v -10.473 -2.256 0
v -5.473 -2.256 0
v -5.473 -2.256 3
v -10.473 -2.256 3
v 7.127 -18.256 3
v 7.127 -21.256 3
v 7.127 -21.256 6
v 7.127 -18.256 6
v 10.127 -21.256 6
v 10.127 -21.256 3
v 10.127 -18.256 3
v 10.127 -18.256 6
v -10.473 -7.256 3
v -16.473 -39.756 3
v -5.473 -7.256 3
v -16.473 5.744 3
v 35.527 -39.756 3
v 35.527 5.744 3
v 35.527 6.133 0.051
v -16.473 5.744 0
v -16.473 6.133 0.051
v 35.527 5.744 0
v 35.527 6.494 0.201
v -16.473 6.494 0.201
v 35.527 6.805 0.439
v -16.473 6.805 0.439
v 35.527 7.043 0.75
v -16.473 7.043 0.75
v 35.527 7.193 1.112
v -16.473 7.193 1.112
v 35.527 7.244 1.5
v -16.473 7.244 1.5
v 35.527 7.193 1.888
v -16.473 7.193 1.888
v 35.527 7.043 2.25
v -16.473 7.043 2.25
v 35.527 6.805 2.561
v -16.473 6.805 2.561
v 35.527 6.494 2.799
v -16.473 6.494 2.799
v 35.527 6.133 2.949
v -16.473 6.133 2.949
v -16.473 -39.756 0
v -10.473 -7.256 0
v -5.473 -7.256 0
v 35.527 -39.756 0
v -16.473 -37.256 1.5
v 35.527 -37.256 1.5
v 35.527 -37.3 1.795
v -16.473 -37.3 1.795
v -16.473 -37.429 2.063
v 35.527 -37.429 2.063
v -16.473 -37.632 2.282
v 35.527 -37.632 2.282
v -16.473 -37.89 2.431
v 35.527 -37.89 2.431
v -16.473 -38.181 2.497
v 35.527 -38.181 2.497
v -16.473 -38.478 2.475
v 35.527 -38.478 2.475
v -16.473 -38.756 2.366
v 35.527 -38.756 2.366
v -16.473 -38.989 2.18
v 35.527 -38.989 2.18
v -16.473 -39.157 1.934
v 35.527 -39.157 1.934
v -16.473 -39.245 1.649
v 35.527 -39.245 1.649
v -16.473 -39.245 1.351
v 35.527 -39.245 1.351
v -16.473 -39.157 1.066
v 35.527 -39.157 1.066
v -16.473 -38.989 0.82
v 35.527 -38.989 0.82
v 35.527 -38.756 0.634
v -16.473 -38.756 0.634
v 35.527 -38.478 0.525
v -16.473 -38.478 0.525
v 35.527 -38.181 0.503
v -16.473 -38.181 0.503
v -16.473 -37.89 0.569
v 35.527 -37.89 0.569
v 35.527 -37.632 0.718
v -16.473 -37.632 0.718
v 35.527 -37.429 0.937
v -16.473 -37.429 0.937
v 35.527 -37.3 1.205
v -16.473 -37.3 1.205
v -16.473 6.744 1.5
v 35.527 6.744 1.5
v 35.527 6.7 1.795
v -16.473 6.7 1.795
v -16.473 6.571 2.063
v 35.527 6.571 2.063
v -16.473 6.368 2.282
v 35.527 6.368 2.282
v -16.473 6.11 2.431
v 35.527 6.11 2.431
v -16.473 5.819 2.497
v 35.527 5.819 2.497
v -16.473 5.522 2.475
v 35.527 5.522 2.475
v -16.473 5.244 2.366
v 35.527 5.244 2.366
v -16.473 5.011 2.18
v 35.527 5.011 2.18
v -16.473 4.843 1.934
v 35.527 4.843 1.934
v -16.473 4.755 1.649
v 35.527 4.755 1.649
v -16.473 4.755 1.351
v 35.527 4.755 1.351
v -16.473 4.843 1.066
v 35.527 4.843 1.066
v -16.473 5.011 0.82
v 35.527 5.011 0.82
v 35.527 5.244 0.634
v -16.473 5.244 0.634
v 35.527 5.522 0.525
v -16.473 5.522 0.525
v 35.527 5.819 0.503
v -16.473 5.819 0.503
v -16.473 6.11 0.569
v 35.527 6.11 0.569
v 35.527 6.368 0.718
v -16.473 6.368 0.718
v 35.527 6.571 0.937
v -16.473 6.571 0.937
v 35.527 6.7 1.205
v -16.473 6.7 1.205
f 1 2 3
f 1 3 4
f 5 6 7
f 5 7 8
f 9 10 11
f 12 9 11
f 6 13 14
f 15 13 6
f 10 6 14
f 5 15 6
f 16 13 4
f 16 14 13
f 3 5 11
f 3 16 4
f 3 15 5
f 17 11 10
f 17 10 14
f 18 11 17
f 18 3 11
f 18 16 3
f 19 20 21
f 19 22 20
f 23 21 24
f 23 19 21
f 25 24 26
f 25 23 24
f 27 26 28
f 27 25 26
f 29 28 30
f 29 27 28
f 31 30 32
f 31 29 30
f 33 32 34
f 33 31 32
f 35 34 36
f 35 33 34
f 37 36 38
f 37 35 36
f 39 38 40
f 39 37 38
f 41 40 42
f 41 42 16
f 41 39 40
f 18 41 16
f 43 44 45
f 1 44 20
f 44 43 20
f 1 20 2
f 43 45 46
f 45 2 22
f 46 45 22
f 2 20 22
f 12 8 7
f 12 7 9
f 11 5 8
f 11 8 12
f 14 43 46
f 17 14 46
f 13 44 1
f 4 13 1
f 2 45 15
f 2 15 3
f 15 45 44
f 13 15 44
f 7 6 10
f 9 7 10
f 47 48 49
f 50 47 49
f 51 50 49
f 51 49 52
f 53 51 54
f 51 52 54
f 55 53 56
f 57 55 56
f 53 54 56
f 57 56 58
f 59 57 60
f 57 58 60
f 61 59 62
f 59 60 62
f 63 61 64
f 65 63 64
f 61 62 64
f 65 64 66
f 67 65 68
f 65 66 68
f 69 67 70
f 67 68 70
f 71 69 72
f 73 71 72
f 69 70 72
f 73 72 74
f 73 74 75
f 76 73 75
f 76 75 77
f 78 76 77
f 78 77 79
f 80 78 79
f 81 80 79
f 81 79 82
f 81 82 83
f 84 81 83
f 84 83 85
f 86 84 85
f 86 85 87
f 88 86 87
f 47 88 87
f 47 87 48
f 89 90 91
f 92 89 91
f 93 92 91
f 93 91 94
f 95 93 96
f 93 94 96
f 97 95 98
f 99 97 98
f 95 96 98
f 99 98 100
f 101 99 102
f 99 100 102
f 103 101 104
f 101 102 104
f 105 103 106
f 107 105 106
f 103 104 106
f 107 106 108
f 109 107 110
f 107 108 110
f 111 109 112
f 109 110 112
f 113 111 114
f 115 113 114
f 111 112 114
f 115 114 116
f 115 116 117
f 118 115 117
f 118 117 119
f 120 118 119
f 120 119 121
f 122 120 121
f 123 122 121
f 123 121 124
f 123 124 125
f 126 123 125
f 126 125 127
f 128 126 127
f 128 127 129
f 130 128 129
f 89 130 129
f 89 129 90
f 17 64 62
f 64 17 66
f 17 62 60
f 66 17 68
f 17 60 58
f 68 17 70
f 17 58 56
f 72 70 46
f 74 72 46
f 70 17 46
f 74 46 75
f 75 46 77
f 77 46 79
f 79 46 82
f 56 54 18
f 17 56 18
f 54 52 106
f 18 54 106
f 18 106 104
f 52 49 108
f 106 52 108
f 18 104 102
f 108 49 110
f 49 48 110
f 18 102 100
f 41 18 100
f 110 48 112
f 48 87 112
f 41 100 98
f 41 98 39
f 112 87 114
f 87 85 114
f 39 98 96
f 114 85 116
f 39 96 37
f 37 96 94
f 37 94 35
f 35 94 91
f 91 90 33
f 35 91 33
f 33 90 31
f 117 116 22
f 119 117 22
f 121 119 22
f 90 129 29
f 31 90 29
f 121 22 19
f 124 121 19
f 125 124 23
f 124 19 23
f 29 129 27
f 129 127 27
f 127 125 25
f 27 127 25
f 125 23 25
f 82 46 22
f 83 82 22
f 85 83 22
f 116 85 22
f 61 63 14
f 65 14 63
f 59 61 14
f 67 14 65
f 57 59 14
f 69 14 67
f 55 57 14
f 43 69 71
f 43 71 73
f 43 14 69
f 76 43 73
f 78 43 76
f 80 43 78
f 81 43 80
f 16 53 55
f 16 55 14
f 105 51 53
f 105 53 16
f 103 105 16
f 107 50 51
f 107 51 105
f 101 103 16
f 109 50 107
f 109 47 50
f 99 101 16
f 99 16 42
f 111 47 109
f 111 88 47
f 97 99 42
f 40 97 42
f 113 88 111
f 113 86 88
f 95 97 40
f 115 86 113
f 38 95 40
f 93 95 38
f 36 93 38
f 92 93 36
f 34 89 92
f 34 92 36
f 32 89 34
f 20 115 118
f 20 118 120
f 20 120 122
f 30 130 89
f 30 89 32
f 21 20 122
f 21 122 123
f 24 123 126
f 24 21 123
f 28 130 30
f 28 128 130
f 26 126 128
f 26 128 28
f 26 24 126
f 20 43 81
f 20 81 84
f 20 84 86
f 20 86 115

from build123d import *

# Parameters (mm, degrees)
SKETCH_1_W          = 52
SKETCH_1_H          = 47
EXTRUDE_1_DEPTH     = 3
SKETCH_2_R          = 1
CUT_EXTRUDE_1_DEPTH = 92
FILLET_1_R          = 1.5
FILLET_2_R          = 1.5
SKETCH_3_R          = 1
CUT_EXTRUDE_2_DEPTH = 92
SKETCH_4_W          = 3
SKETCH_4_H          = 3
EXTRUDE_2_DEPTH     = 3
SKETCH_5_W          = 5
SKETCH_5_H          = 5
CUT_EXTRUDE_3_DEPTH = 6


with BuildPart() as part:
    # 草图1 → 凸台-拉伸1 (new body)
    with BuildSketch(Plane.XY):
        with Locations((9.526717557, -16.255725191)):
            Rectangle(SKETCH_1_W, SKETCH_1_H)
    extrude(amount=EXTRUDE_1_DEPTH)

    # 草图2 → 切除-拉伸1 (cut)
    with BuildSketch(Plane(origin=(35.526717557, 0, 0), x_dir=(0, 0, -1), z_dir=(1, 0, 0))):
        with Locations(Location((-1.5, 5.744274809, 0), (0, 0, 90))):
            Circle(SKETCH_2_R)
    extrude(amount=-CUT_EXTRUDE_1_DEPTH, mode=Mode.SUBTRACT)

    # 圆角1
    fillet_1_edges = [part.edges().sort_by_distance(p)[0] for p in [
        (9.526717557, 7.244274809, 0),
    ]]
    fillet(fillet_1_edges, radius=FILLET_1_R)

    # 圆角2
    fillet_2_edges = [part.edges().sort_by_distance(p)[0] for p in [
        (9.526717557, 7.244274809, 3),
    ]]
    fillet(fillet_2_edges, radius=FILLET_2_R - 0.0001)  # a hair under: the kernel refuses the full size

    # 草图3 → 切除-拉伸2 (cut)
    with BuildSketch(Plane(origin=(35.526717557, 0, 0), x_dir=(0, 0, -1), z_dir=(1, 0, 0))):
        with Locations(Location((-1.5, -38.255725191, 0), (0, 0, 90))):
            Circle(SKETCH_3_R)
    extrude(amount=-CUT_EXTRUDE_2_DEPTH, mode=Mode.SUBTRACT)

    # 草图4 → 凸台-拉伸2 (add)
    with BuildSketch(Plane.XY.offset(3)):
        with Locations((8.626717557, -19.755725191)):
            Rectangle(SKETCH_4_W, SKETCH_4_H)
    extrude(amount=EXTRUDE_2_DEPTH)

    # 草图5 → 切除-拉伸3 (cut)
    with BuildSketch(Plane(origin=(0, 0, 0), x_dir=(-1, 0, 0), z_dir=(0, 0, -1))):
        with Locations((7.973282443, -4.755725191)):
            Rectangle(SKETCH_5_W, SKETCH_5_H)
    extrude(amount=-CUT_EXTRUDE_3_DEPTH, mode=Mode.SUBTRACT)


solid = part.part
